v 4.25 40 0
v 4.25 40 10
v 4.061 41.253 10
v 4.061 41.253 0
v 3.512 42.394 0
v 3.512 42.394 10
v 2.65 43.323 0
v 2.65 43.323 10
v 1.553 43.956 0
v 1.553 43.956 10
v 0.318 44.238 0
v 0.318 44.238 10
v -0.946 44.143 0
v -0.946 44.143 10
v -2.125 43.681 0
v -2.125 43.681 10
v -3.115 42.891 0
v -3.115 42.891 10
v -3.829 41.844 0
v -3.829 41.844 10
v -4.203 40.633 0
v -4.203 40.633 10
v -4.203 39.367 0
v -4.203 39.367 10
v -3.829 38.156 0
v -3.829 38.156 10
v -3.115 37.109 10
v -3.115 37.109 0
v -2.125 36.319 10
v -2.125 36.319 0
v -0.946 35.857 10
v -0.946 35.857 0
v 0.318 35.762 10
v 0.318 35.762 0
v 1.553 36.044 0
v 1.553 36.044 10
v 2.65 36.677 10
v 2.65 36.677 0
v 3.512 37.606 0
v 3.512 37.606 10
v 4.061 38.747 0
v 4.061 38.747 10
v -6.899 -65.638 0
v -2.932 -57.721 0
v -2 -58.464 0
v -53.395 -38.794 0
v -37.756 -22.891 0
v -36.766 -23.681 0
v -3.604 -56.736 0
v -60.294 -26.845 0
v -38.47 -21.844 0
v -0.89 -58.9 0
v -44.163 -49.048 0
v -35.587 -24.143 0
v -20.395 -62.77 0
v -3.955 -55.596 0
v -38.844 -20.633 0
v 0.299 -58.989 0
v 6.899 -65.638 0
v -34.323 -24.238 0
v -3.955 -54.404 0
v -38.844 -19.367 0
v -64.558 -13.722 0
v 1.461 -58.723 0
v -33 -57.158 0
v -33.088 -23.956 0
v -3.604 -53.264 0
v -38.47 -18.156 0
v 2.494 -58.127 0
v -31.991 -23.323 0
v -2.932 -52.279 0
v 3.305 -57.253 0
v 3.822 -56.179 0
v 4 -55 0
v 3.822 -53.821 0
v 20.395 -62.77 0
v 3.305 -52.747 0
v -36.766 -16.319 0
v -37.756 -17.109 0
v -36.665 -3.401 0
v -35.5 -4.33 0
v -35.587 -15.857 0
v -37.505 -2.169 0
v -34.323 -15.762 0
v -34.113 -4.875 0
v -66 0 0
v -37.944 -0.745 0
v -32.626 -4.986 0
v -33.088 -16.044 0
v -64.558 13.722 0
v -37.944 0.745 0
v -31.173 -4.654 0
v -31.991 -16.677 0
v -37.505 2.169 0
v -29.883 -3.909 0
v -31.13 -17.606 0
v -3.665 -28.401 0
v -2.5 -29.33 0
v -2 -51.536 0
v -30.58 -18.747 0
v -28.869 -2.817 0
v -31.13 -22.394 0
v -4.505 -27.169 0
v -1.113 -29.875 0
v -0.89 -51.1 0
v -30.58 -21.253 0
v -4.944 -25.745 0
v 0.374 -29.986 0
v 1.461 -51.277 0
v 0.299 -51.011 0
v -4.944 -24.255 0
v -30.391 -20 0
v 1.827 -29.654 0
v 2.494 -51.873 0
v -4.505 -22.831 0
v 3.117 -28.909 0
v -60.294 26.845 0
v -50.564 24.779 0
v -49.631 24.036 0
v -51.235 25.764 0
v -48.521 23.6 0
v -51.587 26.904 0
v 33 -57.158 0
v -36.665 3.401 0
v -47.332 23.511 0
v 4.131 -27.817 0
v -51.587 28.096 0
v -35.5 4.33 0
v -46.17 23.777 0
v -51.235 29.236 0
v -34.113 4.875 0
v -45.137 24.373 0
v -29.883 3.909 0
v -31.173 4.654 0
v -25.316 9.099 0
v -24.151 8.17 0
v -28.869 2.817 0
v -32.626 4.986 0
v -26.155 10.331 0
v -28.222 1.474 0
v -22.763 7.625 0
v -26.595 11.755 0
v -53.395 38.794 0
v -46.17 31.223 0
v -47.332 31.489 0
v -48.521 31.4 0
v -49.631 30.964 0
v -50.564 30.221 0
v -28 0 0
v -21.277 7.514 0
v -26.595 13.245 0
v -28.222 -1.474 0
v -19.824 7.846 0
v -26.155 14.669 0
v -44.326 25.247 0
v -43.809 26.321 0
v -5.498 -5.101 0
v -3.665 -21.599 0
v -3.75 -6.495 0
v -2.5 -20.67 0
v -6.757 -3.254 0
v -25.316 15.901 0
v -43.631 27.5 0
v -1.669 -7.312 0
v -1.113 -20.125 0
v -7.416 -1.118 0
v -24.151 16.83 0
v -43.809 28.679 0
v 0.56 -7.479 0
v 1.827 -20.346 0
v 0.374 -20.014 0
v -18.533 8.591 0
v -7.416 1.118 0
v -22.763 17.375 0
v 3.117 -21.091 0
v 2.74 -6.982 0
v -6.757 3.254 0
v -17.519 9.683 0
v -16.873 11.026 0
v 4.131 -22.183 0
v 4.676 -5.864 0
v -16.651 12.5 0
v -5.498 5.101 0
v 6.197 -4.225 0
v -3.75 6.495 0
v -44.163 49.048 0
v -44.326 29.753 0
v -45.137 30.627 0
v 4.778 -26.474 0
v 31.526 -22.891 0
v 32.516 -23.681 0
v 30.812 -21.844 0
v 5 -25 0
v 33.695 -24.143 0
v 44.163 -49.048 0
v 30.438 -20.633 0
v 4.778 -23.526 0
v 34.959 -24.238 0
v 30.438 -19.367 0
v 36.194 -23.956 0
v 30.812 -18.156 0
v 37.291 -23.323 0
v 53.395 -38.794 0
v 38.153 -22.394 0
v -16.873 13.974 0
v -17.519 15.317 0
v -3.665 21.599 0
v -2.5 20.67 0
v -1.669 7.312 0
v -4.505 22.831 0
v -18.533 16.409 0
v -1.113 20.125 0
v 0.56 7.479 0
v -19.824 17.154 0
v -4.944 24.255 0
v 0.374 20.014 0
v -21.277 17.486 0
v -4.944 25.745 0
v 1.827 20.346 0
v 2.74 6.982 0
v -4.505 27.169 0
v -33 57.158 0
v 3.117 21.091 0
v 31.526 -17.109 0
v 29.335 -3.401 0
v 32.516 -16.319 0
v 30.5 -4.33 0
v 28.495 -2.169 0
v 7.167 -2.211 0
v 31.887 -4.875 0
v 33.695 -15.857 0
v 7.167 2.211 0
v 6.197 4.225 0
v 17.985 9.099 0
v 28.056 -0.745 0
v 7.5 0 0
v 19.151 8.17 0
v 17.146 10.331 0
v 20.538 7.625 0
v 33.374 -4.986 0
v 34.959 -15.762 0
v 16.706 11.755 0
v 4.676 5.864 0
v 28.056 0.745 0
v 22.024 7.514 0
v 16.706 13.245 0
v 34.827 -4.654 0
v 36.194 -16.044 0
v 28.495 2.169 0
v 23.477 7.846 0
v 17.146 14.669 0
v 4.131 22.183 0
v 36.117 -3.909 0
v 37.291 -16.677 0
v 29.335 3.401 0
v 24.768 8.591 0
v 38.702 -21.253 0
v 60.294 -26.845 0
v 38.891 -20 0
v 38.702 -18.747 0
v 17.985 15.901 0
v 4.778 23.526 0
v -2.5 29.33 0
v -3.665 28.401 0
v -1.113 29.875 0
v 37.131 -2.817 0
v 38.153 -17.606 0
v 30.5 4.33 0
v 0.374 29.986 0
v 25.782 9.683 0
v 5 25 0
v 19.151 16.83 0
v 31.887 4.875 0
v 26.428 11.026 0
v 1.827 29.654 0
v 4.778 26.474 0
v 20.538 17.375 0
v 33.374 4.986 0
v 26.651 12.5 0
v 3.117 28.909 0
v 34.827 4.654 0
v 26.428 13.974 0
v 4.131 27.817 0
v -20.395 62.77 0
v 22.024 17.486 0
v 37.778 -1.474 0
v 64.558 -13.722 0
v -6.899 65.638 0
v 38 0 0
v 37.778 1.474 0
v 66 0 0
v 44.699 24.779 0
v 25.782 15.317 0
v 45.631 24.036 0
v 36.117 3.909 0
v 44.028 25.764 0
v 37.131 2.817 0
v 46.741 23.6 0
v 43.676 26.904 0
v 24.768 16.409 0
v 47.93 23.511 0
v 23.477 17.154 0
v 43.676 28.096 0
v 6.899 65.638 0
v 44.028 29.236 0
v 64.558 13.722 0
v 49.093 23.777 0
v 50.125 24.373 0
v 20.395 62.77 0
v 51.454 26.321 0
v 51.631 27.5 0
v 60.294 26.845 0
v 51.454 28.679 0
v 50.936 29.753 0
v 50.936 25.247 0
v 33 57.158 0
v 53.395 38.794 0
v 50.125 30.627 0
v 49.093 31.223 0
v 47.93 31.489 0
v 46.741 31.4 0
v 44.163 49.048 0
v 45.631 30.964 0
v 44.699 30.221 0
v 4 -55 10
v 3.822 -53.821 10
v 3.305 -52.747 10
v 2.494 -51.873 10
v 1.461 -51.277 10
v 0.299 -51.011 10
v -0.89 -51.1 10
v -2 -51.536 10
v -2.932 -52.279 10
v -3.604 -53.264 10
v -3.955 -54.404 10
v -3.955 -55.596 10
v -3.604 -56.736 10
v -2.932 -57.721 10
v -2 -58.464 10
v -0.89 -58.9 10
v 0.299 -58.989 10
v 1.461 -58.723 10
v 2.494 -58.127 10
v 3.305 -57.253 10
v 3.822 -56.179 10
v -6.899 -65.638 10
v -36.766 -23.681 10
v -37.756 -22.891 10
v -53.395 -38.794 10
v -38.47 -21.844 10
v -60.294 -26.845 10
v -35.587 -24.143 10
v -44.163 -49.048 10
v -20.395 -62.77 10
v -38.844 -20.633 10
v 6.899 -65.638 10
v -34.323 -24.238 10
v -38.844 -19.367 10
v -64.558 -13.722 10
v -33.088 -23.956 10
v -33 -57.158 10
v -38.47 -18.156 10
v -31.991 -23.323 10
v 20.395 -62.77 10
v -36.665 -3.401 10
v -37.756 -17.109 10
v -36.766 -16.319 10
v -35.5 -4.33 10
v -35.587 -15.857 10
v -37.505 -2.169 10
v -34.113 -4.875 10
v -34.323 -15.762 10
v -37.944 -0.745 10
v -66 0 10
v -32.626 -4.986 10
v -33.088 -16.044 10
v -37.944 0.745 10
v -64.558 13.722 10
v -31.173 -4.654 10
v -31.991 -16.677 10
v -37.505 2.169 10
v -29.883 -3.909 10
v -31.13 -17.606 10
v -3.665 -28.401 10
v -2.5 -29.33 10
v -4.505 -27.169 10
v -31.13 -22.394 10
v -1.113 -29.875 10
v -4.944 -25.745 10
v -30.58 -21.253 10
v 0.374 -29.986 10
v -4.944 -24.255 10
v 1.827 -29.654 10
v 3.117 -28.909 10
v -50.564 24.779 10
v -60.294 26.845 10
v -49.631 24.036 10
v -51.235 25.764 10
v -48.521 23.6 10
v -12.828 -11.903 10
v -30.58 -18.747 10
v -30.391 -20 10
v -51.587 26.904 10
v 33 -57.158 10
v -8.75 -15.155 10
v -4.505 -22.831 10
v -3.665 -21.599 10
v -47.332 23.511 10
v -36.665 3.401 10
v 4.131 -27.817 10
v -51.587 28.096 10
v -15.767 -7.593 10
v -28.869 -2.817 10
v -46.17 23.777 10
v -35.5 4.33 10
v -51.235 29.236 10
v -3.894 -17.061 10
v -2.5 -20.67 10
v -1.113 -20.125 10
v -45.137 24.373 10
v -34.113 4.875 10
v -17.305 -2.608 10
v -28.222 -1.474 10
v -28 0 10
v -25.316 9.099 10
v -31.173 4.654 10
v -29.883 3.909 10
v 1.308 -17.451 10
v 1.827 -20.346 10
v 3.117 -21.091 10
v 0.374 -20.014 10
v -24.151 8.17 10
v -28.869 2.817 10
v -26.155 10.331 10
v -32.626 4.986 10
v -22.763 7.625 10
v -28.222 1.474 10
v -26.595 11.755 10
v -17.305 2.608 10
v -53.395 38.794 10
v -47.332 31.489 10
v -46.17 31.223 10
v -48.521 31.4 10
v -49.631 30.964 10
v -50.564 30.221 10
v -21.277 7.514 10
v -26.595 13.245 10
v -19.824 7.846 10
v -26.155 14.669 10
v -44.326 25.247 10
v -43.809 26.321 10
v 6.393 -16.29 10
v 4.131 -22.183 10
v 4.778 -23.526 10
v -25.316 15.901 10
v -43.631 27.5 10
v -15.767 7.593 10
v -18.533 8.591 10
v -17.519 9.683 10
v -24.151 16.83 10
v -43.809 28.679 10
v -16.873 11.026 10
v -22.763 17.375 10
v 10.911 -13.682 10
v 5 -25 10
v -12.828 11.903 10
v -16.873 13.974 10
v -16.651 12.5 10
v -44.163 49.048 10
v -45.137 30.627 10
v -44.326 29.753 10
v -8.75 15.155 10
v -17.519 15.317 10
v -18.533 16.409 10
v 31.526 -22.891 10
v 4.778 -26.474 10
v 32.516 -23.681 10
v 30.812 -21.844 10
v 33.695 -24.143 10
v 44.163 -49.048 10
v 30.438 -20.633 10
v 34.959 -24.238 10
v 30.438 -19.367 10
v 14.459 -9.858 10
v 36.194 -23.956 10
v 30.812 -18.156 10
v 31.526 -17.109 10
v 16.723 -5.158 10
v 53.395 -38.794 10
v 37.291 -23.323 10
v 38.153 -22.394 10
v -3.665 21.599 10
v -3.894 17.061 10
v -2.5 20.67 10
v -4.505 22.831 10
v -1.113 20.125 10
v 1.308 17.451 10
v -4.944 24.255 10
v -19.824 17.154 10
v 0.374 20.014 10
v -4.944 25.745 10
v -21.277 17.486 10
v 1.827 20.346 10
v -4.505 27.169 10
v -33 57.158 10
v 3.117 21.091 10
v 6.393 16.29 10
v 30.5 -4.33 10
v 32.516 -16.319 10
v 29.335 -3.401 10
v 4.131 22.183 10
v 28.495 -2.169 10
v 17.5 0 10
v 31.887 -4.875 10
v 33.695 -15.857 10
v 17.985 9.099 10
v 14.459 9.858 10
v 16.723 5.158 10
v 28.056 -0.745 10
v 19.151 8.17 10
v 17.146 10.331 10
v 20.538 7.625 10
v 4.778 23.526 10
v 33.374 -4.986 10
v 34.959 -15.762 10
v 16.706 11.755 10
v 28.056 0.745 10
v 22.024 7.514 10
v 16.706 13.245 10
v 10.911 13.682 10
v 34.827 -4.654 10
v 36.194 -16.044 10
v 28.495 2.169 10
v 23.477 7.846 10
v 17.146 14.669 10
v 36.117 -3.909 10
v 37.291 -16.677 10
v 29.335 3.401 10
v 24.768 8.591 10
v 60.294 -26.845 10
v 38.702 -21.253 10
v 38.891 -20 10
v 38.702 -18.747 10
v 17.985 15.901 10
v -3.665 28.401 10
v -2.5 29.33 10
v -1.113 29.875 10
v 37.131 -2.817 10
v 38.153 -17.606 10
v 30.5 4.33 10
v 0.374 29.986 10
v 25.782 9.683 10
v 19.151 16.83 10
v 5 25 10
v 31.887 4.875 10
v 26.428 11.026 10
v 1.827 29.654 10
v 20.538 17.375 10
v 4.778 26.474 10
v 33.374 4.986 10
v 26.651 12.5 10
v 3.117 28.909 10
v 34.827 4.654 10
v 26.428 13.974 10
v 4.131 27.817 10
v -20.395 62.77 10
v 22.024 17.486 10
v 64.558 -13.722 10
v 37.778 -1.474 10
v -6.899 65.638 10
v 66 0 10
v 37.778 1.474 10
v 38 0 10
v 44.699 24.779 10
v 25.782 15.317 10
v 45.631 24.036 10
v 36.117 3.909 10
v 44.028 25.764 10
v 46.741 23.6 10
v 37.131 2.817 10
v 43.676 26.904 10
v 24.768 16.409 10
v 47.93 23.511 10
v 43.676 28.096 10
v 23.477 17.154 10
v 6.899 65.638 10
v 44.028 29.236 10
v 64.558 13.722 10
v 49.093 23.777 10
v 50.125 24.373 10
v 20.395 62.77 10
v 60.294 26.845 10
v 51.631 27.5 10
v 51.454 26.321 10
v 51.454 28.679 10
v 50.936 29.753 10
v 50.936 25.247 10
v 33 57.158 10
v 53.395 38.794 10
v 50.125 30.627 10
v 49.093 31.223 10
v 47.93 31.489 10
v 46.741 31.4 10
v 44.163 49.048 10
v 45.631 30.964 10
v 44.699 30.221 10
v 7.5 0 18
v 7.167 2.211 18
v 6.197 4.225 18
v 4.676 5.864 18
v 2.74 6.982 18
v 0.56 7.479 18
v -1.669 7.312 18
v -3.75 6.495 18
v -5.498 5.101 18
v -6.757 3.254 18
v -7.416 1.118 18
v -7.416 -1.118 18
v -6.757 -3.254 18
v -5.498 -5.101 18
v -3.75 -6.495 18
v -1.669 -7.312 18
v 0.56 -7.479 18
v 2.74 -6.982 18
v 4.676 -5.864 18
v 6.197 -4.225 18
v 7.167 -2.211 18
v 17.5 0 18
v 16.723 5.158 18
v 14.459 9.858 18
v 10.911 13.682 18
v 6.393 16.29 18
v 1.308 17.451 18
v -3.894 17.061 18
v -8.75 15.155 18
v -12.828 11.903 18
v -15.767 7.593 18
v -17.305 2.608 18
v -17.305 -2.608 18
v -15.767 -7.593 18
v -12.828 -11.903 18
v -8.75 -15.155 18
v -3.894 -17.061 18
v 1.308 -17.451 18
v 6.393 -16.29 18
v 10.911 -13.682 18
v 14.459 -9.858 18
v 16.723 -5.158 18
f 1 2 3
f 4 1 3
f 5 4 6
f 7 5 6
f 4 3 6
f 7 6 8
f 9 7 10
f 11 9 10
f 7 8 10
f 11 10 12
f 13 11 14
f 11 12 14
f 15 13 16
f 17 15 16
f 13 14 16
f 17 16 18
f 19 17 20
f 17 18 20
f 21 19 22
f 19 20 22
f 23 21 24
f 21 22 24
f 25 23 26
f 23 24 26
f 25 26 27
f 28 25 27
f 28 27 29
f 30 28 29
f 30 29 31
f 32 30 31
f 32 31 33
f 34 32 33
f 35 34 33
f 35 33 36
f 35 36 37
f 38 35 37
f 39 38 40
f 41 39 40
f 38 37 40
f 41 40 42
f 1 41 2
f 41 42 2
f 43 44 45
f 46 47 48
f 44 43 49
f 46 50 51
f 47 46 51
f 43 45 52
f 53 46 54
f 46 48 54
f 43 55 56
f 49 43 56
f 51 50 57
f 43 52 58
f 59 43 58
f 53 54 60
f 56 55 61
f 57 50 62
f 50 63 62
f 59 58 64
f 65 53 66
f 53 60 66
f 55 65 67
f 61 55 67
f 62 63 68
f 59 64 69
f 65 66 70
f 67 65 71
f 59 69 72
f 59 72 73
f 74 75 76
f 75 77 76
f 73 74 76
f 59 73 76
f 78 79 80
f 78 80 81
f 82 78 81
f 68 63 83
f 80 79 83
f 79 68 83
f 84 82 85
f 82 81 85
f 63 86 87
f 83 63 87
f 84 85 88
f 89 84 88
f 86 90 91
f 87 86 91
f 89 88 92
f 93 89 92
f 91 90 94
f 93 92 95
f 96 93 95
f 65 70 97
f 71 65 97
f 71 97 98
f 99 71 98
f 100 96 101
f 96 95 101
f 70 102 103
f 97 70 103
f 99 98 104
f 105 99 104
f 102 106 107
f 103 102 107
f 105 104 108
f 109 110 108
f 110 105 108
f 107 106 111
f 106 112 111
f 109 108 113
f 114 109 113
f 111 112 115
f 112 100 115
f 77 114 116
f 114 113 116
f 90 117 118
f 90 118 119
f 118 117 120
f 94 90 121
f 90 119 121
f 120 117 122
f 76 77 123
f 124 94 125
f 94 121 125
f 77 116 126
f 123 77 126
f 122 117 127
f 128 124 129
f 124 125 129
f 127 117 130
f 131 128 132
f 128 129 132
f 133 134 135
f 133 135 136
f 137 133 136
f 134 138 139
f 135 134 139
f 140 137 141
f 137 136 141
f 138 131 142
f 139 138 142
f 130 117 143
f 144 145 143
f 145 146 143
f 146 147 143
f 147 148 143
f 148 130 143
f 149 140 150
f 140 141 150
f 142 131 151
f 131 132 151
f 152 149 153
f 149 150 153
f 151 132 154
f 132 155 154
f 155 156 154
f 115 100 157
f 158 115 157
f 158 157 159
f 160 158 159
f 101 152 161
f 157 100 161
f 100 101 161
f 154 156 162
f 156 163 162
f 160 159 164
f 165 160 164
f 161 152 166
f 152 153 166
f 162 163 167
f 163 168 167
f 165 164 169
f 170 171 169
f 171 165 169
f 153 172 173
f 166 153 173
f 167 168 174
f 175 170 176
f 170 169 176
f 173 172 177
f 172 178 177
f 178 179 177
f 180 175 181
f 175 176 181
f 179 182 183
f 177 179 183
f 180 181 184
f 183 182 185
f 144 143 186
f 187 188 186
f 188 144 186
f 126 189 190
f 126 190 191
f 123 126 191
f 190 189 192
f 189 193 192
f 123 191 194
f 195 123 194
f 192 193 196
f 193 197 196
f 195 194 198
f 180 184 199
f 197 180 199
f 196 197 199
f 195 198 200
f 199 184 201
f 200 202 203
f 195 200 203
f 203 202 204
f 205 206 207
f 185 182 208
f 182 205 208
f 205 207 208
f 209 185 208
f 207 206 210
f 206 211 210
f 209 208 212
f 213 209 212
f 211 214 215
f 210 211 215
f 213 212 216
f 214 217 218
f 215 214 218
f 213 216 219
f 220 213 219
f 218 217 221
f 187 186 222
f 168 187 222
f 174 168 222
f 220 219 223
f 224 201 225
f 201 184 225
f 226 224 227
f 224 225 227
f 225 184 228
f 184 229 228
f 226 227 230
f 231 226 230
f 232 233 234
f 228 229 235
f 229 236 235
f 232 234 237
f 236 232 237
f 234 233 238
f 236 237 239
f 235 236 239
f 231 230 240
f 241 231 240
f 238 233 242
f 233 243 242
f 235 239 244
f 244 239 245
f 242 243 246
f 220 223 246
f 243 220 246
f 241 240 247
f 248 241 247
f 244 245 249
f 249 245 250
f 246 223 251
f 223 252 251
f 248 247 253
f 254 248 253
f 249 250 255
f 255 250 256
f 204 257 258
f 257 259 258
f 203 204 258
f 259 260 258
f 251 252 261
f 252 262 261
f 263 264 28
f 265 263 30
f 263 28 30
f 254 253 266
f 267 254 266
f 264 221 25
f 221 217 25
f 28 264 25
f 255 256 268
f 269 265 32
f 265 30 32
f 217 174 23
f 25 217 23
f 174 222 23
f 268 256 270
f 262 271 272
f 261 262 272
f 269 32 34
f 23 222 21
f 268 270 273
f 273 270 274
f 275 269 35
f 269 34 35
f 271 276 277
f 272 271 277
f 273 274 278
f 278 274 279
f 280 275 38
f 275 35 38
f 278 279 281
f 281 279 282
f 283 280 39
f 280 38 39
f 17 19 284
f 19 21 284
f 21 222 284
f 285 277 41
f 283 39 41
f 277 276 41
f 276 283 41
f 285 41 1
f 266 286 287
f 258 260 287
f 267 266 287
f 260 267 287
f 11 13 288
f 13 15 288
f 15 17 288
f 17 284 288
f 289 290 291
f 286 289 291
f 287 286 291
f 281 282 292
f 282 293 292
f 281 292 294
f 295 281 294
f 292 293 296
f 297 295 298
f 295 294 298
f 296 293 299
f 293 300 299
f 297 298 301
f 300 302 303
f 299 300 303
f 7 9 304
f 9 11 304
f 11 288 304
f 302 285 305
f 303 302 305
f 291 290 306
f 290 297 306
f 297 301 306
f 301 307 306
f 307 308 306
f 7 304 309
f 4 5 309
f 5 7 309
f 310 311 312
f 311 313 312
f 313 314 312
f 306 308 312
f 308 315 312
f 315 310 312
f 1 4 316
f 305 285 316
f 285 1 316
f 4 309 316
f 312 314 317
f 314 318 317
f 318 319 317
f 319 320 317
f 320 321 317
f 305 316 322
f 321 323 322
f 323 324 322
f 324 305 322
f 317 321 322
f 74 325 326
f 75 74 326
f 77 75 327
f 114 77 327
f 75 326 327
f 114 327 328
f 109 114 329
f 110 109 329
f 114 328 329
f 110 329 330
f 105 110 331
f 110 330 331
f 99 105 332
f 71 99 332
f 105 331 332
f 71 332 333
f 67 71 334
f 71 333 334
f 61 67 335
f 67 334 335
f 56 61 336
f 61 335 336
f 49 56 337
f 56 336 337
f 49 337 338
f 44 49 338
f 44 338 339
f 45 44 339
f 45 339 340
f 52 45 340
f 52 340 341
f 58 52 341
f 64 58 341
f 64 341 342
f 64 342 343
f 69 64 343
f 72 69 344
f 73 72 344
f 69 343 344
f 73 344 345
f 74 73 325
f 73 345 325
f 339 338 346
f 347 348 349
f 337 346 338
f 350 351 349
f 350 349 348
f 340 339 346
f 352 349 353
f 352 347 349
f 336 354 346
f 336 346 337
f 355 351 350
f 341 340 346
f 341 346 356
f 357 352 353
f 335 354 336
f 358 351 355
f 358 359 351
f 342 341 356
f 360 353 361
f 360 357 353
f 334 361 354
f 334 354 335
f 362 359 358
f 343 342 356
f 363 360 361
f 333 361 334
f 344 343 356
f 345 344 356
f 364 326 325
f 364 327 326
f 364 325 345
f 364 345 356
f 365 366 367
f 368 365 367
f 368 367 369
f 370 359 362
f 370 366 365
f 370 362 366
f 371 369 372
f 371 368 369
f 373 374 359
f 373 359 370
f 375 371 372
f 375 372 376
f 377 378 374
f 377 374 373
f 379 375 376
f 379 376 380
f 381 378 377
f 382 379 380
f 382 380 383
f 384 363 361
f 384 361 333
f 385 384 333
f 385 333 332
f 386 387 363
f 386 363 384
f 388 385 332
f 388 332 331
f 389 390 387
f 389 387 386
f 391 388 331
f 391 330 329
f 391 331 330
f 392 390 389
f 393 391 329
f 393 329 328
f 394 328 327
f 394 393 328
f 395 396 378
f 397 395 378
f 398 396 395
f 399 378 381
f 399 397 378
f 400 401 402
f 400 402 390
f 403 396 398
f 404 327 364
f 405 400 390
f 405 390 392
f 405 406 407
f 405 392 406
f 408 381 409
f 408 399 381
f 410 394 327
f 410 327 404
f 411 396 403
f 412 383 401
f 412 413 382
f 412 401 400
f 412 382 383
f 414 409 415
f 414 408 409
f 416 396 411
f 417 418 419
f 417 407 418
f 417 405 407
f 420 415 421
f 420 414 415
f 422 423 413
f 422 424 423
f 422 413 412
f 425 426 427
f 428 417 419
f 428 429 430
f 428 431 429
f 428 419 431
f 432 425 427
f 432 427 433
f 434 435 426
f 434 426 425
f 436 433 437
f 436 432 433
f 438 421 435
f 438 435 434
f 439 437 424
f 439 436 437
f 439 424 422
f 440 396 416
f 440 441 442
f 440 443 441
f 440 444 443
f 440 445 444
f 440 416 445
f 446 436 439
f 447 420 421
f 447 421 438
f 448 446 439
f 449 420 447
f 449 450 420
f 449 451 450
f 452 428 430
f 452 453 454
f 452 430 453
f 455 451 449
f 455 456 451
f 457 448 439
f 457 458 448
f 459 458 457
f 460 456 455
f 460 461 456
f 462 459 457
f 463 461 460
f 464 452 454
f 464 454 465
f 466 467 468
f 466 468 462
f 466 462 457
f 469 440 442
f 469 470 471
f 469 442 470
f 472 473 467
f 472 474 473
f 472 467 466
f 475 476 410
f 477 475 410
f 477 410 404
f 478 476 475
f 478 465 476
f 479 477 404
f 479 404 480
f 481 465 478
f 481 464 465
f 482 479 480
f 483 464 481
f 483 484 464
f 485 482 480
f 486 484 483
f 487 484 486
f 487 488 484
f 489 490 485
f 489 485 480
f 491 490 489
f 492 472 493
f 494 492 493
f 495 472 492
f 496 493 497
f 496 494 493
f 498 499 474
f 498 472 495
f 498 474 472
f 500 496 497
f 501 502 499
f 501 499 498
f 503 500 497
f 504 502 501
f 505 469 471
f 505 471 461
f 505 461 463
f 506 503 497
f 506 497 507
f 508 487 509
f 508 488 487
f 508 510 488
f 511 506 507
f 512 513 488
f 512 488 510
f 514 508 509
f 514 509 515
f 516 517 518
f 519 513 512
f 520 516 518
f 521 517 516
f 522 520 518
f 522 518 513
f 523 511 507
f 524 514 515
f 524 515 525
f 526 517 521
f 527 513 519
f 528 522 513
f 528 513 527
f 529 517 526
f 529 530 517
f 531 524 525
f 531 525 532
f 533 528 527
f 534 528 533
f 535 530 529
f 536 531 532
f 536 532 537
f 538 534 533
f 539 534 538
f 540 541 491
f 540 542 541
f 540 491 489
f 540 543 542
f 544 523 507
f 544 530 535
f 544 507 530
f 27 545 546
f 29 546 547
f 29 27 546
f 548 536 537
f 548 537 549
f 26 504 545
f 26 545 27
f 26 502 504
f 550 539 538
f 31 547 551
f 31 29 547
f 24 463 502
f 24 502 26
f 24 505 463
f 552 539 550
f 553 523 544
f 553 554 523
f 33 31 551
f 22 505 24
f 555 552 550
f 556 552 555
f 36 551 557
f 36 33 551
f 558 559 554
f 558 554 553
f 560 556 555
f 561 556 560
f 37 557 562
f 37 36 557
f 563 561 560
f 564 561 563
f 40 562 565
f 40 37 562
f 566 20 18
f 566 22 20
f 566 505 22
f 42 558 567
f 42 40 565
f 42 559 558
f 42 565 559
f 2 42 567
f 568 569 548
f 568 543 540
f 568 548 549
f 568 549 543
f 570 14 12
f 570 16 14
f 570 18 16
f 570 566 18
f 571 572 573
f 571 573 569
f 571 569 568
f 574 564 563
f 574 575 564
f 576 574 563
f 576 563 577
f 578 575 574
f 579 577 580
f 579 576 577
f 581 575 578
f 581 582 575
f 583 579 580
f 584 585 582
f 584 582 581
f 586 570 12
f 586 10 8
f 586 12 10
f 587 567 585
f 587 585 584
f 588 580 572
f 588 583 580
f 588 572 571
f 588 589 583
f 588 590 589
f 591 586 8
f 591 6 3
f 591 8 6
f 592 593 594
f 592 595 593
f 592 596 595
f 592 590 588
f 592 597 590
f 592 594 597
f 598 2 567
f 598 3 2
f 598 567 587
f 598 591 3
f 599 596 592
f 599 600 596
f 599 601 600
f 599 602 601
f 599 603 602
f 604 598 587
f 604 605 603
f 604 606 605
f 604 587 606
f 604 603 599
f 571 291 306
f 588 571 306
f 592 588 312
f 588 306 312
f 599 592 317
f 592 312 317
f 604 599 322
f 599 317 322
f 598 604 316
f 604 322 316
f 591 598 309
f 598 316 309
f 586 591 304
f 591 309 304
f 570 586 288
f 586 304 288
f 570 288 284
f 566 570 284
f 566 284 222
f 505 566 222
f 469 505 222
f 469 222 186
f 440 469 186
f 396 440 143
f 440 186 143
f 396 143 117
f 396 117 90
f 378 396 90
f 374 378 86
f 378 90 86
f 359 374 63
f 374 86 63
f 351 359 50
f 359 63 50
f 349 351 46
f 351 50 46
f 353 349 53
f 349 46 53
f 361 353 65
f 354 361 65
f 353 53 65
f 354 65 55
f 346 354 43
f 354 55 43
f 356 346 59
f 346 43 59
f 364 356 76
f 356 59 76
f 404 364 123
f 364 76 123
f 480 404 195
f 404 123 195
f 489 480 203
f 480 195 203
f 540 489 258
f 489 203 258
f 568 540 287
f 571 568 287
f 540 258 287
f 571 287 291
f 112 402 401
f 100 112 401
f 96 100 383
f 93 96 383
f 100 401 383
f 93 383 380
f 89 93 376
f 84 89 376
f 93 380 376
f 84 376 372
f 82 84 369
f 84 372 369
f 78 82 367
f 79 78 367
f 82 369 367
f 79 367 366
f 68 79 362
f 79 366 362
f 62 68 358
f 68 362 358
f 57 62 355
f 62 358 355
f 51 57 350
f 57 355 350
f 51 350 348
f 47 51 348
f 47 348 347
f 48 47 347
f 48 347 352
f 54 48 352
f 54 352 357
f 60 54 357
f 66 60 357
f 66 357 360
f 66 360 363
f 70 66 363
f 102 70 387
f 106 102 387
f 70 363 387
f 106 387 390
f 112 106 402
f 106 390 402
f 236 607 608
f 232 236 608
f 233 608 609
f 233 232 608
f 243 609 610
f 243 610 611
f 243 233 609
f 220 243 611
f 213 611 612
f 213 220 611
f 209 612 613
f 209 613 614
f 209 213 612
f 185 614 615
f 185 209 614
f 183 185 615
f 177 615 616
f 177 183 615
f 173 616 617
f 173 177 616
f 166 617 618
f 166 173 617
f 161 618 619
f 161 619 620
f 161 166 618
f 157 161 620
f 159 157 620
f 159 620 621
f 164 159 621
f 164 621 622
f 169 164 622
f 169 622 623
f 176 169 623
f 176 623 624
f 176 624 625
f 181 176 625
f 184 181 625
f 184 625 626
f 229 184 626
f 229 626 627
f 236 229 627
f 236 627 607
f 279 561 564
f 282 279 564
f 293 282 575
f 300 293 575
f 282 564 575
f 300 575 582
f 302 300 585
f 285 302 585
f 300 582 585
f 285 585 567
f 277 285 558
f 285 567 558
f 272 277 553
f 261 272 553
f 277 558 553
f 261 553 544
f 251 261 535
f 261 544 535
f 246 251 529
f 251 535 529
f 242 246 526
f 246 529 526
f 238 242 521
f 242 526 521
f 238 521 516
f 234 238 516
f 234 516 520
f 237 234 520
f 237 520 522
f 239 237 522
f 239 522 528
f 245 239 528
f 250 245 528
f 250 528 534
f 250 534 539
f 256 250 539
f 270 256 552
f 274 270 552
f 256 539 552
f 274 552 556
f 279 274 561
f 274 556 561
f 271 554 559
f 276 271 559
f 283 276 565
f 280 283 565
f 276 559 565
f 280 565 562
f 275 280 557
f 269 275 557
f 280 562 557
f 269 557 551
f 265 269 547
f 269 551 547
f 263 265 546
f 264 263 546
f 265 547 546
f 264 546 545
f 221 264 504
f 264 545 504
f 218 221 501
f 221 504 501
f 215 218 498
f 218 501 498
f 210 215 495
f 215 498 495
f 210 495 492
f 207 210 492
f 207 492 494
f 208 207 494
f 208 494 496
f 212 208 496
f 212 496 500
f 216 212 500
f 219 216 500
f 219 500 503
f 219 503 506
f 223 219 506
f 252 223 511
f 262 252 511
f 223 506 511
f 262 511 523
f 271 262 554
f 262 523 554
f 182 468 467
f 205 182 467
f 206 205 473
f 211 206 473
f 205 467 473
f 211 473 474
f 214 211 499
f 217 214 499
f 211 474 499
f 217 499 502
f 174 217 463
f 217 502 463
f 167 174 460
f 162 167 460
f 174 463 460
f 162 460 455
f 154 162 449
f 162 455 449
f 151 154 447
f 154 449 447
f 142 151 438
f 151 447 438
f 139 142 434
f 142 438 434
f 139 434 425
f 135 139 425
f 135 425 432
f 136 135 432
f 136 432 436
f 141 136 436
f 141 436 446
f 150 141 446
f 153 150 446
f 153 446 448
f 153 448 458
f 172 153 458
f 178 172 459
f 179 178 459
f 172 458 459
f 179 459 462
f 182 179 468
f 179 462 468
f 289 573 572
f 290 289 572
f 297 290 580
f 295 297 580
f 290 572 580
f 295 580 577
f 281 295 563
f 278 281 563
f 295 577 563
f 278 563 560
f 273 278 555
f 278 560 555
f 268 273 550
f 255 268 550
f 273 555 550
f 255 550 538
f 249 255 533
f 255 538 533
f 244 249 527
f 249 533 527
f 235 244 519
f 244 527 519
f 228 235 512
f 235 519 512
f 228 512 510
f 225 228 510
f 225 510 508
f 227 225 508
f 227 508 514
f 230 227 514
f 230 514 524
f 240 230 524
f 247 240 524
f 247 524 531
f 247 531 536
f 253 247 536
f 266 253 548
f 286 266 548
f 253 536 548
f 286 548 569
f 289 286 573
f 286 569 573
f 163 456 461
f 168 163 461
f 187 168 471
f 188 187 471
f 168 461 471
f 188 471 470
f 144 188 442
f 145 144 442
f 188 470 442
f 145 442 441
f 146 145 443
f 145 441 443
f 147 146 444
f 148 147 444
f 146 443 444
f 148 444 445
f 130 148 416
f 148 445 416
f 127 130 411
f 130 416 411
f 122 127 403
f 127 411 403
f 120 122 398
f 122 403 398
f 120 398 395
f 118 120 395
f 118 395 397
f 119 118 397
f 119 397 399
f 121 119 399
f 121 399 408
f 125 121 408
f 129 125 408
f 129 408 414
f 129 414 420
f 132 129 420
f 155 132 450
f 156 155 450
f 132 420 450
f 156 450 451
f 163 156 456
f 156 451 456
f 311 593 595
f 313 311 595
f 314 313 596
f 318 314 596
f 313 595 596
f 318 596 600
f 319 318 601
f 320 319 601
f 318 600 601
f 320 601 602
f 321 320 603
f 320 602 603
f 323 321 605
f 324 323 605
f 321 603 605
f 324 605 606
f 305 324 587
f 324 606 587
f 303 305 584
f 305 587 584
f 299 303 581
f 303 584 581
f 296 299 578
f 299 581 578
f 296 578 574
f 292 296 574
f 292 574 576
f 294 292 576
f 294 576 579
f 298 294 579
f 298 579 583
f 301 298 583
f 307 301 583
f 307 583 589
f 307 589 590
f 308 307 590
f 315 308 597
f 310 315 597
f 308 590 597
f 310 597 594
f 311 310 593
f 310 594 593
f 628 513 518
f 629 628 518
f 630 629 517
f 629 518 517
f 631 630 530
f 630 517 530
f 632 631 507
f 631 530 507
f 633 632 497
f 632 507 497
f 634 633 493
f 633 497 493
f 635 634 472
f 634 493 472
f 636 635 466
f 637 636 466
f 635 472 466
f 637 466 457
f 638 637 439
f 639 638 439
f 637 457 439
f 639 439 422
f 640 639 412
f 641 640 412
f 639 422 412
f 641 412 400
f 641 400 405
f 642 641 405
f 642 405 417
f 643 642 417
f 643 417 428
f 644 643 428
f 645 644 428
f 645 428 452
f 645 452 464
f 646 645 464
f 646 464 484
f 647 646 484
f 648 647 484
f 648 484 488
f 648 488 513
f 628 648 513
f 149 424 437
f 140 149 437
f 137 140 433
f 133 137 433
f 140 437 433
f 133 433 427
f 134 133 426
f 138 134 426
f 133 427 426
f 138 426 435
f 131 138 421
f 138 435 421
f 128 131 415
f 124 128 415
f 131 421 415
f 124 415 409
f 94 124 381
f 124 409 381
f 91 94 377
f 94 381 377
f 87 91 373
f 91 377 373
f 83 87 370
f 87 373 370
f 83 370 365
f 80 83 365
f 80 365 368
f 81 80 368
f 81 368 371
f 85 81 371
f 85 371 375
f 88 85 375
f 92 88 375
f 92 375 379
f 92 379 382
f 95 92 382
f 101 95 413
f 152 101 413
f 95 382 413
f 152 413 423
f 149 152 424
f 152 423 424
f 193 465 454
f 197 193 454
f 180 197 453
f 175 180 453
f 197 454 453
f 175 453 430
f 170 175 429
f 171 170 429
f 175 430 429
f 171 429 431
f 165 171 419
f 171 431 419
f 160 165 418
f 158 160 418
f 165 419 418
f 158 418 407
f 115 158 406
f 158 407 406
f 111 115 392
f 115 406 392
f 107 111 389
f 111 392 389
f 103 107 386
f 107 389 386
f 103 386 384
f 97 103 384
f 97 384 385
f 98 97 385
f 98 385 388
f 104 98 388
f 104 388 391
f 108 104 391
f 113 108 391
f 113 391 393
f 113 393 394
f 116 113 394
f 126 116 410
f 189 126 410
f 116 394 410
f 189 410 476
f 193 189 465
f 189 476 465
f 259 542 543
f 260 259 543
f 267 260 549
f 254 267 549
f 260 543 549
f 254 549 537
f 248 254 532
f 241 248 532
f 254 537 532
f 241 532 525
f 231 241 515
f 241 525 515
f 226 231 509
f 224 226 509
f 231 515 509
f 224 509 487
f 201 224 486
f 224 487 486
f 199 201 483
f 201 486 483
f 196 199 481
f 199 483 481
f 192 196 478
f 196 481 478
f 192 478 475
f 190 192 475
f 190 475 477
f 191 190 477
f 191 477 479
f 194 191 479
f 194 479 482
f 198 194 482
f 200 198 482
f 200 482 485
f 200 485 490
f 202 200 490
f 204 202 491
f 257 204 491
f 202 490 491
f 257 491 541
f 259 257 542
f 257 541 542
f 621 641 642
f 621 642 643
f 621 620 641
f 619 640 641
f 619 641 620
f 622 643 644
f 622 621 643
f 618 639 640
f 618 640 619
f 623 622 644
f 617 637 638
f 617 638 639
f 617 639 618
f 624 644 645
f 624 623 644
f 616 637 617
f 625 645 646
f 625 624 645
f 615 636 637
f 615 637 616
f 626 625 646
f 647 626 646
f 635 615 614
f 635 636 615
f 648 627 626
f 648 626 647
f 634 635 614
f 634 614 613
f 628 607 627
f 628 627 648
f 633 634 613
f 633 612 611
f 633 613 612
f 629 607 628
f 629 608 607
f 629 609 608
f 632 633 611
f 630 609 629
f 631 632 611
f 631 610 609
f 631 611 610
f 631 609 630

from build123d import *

# Parameters (mm, degrees)
F0_R     = 66
F0_R_2   = 17.5
F0_R_3   = 7.5
F1_DEPTH = 10
F2_DEPTH = 18
F3_R     = 5
F3_R_2   = 4.25
F3_R_3   = 4
F4_DEPTH = 10


with BuildPart() as f1:
    # F0 (on Top) → F1 (new body)
    with BuildSketch(Plane.XY):
        Circle(F0_R)
        Circle(F0_R_2, mode=Mode.SUBTRACT)
        Circle(F0_R_2)
        Circle(F0_R_3, mode=Mode.SUBTRACT)
    extrude(amount=F1_DEPTH)

    # F0 (on Top) → F2 (join)
    with BuildSketch(Plane.XY):
        Circle(F0_R_2)
        Circle(F0_R_3, mode=Mode.SUBTRACT)
    extrude(amount=F2_DEPTH)

    # F3 (on face) → F4 (cut, through all)
    with BuildSketch(Plane.XY.offset(10)):
        with Locations((0, -25)):
            Circle(F3_R)
        with Locations((21.650635, 12.5)):
            Circle(F3_R)
        with Locations((0, 25)):
            Circle(F3_R)
        with Locations((-21.650635, 12.5)):
            Circle(F3_R)
        with Locations((-33, 0)):
            Circle(F3_R)
        with Locations((33, 0)):
            Circle(F3_R)
        with Locations((-34.641016, -20)):
            Circle(F3_R_2)
        with Locations((0, 40)):
            Circle(F3_R_2)
        with Locations((34.641016, -20)):
            Circle(F3_R_2)
        with Locations((0, -55)):
            Circle(F3_R_3)
        with Locations((-47.631397, 27.5)):
            Circle(F3_R_3)
        with Locations((47.631397, 27.5)):
            Circle(F3_R_3)
    extrude(amount=-F4_DEPTH, mode=Mode.SUBTRACT)


solid = f1.part
